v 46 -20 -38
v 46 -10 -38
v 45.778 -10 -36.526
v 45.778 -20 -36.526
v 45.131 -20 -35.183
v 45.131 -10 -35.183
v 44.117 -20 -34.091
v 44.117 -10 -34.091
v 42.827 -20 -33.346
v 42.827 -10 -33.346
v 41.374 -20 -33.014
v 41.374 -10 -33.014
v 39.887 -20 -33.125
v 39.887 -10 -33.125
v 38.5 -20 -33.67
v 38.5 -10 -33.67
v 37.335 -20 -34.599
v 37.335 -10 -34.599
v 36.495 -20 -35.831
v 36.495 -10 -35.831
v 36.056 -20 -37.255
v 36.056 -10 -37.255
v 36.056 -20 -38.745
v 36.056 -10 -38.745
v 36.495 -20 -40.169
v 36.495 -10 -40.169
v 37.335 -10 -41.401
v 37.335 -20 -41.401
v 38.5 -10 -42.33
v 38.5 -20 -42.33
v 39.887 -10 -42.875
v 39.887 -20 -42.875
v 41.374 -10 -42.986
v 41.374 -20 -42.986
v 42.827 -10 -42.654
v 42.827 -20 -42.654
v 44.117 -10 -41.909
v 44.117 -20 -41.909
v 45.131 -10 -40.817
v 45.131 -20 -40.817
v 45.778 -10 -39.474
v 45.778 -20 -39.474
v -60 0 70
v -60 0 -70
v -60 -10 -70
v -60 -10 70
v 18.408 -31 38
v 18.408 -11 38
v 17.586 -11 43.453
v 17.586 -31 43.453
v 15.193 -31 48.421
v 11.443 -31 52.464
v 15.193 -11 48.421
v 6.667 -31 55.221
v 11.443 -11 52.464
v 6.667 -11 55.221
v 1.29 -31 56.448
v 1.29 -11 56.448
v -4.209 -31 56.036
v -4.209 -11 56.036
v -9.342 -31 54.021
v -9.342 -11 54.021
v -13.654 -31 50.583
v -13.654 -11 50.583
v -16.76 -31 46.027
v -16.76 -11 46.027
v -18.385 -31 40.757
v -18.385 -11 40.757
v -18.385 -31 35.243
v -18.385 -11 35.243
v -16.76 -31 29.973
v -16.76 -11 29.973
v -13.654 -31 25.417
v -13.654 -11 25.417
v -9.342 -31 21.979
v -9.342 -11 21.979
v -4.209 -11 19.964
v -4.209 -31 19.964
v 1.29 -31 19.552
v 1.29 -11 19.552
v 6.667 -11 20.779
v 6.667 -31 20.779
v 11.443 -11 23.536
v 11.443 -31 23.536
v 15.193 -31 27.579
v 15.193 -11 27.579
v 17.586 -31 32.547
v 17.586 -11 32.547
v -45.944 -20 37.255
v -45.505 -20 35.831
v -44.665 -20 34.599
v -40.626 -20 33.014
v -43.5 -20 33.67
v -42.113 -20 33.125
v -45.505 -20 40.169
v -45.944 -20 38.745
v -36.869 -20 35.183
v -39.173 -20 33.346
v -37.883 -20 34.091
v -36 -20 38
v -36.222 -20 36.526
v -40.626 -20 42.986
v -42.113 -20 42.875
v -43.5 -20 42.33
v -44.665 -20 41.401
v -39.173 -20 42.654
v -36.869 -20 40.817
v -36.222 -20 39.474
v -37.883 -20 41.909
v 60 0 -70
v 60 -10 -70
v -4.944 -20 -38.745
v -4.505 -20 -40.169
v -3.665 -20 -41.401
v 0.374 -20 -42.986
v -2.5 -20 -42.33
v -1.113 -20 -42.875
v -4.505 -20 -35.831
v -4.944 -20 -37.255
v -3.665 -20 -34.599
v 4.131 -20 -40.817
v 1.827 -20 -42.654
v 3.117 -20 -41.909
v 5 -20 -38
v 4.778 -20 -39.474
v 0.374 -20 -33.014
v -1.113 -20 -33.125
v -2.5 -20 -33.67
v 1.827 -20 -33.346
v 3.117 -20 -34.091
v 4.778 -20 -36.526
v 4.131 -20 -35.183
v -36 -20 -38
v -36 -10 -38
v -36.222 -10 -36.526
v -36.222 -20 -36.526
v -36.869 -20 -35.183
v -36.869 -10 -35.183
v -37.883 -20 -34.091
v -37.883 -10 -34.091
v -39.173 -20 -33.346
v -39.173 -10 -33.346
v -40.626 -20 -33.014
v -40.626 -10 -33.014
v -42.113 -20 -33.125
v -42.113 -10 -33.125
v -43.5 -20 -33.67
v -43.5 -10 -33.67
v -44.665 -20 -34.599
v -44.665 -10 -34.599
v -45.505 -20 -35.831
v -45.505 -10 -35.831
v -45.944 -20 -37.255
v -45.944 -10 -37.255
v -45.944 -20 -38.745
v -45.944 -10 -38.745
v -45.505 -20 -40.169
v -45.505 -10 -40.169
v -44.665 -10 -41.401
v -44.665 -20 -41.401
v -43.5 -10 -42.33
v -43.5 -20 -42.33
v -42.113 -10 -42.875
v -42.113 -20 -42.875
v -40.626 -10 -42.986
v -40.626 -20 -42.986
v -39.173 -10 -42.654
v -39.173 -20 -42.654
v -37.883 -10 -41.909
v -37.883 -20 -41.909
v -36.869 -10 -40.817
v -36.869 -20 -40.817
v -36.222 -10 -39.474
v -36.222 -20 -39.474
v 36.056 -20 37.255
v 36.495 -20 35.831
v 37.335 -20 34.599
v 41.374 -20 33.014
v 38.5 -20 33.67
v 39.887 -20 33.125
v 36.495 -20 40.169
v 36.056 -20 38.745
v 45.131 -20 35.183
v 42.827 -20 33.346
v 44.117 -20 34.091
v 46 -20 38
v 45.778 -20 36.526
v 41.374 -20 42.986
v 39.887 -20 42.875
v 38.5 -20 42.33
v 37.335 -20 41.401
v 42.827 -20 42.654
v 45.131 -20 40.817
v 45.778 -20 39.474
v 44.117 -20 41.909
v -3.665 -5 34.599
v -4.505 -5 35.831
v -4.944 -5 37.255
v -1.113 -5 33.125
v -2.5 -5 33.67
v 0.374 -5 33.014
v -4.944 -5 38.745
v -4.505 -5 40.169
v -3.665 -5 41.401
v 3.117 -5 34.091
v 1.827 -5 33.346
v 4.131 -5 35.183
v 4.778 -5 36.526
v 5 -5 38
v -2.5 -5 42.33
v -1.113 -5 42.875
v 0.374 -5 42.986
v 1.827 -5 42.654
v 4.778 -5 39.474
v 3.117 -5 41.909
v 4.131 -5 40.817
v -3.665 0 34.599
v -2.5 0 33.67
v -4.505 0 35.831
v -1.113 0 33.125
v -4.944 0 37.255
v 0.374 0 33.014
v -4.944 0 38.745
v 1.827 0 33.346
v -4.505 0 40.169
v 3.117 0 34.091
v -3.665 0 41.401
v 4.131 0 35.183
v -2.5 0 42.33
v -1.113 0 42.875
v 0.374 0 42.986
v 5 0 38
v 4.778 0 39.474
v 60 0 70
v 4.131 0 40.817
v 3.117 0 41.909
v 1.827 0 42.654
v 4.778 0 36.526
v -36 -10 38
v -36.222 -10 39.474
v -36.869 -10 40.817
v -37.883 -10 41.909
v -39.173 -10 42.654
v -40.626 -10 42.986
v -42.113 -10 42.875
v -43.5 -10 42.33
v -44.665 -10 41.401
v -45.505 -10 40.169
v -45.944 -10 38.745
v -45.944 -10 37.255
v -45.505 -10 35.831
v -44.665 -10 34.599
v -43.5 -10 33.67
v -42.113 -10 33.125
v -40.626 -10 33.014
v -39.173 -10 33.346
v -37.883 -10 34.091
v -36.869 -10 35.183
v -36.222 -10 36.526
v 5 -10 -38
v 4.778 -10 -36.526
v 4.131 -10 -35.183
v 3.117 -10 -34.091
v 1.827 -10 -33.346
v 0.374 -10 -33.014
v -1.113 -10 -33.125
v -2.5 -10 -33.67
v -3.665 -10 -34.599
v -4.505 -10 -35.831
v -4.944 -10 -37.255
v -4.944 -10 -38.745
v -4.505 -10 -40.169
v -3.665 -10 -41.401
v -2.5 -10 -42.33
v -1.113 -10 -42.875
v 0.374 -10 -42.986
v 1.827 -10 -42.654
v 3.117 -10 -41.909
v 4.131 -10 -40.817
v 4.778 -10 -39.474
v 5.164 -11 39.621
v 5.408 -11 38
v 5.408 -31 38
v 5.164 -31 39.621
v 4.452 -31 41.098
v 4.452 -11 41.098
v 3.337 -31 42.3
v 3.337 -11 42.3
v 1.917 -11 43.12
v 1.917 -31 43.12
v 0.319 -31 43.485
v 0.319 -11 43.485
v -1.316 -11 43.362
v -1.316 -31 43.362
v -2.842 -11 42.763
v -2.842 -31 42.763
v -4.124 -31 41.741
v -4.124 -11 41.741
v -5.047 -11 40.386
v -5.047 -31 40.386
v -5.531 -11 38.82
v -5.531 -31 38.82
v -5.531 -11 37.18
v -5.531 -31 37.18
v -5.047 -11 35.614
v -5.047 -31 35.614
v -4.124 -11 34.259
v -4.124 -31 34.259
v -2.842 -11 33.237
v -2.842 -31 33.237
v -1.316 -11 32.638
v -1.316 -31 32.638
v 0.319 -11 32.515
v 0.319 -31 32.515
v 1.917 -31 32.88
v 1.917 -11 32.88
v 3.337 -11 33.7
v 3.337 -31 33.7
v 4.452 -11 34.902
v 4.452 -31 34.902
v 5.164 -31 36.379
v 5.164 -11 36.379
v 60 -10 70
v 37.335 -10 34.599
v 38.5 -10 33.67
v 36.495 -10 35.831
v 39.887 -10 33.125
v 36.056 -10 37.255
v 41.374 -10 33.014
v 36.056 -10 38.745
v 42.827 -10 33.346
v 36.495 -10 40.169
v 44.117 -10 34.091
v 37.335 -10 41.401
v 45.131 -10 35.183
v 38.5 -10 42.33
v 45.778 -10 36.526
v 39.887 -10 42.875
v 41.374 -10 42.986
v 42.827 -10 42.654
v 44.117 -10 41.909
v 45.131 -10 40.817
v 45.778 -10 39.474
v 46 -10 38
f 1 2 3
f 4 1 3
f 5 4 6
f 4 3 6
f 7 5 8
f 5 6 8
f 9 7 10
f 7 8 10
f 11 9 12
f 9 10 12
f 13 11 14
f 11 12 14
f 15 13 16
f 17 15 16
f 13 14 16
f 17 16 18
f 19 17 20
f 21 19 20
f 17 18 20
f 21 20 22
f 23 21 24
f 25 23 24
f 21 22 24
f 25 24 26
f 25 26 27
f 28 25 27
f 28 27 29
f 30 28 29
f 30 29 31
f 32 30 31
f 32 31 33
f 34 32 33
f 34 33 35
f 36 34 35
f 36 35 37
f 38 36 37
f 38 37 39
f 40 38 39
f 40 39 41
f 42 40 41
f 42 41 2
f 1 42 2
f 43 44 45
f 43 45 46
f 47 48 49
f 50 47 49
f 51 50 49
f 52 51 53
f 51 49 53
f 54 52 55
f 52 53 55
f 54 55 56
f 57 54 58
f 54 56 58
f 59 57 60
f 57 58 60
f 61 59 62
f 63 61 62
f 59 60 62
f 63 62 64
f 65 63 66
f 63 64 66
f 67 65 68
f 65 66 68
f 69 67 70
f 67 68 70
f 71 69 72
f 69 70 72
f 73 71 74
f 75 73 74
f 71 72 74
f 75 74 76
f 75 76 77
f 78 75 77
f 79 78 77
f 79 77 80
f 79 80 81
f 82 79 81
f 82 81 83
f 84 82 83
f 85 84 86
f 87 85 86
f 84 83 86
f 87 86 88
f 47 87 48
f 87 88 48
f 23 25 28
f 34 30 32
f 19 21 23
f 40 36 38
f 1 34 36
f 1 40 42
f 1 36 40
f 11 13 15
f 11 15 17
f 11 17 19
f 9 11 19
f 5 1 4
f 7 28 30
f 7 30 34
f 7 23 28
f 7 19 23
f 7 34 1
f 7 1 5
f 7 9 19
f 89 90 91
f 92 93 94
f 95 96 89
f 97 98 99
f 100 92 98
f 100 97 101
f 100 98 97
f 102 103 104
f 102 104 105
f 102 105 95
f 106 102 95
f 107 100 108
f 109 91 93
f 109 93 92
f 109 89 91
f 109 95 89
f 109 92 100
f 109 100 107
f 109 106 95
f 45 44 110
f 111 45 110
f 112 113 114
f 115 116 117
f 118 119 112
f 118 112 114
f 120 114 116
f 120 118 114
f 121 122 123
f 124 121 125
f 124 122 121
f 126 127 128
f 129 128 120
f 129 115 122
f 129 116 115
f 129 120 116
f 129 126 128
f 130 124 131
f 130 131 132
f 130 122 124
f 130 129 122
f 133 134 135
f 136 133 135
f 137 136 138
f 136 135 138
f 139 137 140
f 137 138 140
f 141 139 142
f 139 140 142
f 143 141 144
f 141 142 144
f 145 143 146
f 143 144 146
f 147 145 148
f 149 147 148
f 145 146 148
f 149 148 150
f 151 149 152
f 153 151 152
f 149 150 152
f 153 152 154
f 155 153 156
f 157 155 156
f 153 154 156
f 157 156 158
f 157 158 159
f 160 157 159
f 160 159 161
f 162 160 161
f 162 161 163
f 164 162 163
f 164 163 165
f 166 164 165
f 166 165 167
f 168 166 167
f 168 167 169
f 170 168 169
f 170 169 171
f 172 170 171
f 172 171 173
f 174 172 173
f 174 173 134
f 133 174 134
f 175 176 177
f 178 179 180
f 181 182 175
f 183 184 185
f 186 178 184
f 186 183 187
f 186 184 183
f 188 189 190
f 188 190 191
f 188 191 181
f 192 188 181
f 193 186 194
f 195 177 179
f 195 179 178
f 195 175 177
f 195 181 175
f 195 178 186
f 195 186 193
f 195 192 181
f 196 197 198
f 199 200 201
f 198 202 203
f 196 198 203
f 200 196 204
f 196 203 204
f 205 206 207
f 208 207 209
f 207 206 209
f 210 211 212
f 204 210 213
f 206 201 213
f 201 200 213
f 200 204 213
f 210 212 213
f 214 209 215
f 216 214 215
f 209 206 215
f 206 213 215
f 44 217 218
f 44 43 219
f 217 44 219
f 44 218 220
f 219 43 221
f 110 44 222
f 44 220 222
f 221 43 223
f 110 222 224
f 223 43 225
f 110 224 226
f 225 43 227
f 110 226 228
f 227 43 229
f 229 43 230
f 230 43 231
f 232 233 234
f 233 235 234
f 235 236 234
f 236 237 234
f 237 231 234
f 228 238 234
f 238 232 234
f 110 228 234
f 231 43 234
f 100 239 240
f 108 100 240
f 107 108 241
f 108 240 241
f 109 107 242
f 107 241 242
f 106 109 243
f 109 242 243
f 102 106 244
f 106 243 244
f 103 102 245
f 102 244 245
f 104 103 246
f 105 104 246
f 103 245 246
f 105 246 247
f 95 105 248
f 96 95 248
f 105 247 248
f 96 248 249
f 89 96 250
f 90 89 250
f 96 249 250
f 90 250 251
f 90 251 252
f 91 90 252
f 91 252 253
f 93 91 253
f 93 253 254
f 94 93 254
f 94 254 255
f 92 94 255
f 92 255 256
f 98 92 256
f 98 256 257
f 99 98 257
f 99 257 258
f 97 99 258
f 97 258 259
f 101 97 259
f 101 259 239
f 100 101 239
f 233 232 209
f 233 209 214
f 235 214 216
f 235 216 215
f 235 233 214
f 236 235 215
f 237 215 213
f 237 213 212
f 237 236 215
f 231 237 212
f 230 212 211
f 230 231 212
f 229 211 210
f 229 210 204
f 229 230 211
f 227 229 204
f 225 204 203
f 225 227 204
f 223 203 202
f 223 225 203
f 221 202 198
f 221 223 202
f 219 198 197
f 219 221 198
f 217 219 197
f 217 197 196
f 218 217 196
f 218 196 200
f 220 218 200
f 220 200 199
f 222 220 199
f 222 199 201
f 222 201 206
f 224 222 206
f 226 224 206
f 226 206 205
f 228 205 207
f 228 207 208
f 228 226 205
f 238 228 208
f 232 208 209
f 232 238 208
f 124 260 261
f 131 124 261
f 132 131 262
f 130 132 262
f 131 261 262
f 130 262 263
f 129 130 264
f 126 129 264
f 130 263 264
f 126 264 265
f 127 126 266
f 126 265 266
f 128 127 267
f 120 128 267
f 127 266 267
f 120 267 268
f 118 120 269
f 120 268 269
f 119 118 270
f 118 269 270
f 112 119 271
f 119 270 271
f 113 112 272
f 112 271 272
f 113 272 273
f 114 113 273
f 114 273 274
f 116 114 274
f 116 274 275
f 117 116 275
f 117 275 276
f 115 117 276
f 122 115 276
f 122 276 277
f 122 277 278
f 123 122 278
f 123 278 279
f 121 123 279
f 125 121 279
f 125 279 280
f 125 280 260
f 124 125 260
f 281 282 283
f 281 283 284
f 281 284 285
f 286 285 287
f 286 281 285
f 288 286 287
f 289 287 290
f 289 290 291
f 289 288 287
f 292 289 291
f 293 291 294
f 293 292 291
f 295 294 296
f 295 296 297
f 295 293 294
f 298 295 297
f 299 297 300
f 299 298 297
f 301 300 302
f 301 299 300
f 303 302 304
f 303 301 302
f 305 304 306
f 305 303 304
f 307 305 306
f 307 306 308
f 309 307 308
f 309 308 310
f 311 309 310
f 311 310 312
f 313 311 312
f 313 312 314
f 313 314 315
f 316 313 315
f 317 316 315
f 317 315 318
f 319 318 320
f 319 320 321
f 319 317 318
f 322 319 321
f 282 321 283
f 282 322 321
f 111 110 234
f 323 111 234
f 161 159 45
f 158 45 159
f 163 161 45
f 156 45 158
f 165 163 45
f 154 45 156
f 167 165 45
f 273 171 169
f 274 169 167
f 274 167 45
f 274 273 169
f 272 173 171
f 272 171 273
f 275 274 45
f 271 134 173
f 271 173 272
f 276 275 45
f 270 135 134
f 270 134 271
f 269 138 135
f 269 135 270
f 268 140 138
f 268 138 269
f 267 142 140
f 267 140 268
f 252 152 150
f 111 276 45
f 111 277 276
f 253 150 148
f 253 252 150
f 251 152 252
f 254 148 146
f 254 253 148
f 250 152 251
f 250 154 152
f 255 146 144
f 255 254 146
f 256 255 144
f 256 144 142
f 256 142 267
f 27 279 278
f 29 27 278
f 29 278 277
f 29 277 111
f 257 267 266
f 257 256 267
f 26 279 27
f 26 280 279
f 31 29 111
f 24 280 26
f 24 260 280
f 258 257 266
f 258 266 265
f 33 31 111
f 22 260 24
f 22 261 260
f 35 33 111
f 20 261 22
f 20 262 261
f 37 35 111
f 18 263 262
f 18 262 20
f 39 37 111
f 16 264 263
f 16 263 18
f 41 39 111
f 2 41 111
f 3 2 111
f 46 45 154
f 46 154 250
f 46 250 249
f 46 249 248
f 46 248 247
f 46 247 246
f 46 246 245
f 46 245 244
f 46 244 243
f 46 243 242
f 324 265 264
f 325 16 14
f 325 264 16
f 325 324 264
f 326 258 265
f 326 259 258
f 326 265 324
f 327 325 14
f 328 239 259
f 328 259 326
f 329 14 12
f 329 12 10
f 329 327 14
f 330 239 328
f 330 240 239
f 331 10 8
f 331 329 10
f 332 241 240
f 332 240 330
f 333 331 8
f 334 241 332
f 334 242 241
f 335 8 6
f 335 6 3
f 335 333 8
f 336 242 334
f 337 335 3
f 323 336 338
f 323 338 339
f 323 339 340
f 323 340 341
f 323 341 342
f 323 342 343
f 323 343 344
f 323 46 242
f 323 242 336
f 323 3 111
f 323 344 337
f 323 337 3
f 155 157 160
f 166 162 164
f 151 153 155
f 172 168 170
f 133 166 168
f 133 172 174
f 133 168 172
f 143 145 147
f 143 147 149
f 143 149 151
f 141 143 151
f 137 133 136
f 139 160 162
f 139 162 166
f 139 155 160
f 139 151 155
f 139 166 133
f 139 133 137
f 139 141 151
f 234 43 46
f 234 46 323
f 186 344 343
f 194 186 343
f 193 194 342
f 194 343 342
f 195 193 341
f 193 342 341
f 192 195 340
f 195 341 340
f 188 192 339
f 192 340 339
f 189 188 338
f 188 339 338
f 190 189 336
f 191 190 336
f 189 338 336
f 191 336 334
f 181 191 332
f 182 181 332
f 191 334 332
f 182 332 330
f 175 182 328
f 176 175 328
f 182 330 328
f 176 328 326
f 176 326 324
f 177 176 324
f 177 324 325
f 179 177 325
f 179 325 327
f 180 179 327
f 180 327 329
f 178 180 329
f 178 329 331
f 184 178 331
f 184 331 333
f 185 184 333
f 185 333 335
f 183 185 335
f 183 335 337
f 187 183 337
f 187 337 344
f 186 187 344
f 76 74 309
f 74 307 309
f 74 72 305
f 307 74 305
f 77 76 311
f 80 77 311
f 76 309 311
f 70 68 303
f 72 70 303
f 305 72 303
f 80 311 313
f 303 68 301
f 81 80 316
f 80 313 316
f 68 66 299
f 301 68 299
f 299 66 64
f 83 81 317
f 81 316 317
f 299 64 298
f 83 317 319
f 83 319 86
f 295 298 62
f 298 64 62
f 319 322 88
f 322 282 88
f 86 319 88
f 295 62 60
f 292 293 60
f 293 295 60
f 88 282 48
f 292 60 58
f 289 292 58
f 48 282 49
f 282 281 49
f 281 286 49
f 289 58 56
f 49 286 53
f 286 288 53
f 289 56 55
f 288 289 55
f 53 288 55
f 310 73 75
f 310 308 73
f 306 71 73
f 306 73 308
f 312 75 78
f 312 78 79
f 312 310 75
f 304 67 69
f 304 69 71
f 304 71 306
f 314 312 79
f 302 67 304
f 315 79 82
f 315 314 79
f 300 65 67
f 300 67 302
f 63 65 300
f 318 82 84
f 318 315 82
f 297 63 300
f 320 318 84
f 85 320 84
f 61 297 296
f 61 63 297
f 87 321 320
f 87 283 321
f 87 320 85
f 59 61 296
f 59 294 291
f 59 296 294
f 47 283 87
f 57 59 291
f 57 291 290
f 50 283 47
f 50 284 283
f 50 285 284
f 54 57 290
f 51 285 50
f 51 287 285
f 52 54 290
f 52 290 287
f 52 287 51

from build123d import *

# Parameters (mm, degrees)
F0_W     = 120
F0_H     = 140
F0_R     = 5
F1_DEPTH = 10
F2_DEPTH = 5
F3_DEPTH = 20
F5_R     = 18.5
F5_R_2   = 5.5
F6_DEPTH = 20


with BuildPart() as f1:
    # F0 (on Front) → F1 (new body)
    with BuildSketch(Plane.XZ):
        Rectangle(F0_W, F0_H)
        with Locations((-41, -38)):
            Circle(F0_R, mode=Mode.SUBTRACT)
        with Locations((0, -38)):
            Circle(F0_R, mode=Mode.SUBTRACT)
        with Locations((41, -38)):
            Circle(F0_R, mode=Mode.SUBTRACT)
        with Locations((-41, 38)):
            Circle(F0_R, mode=Mode.SUBTRACT)
        with Locations((0, 38)):
            Circle(F0_R, mode=Mode.SUBTRACT)
        with Locations((41, 38)):
            Circle(F0_R, mode=Mode.SUBTRACT)
        with Locations((0, 38)):
            Circle(F0_R)
        with Locations((-41, 38)):
            Circle(F0_R)
        with Locations((41, 38)):
            Circle(F0_R)
        with Locations((41, -38)):
            Circle(F0_R)
        with Locations((-41, -38)):
            Circle(F0_R)
    extrude(amount=F1_DEPTH)

    # F0 (on Front) → F2 (cut)
    with BuildSketch(Plane.XZ):
        with Locations((0, 38)):
            Circle(F0_R)
    extrude(amount=F2_DEPTH, mode=Mode.SUBTRACT)

    # F0 (on Front) → F3 (join)
    with BuildSketch(Plane.XZ):
        with Locations((-41, 38)):
            Circle(F0_R)
        with Locations((-41, -38)):
            Circle(F0_R)
        with Locations((41, -38)):
            Circle(F0_R)
        with Locations((41, 38)):
            Circle(F0_R)
        with Locations((0, -38)):
            Circle(F0_R)
    extrude(amount=F3_DEPTH)


with BuildPart() as f6:
    # F5 (on offset) → F6 (new body)
    with BuildSketch(Plane.XZ.offset(11)):
        with Locations((-0.0920584644, 38)):
            Circle(F5_R)
        with Locations((-0.0920584644, 38)):
            Circle(F5_R_2, mode=Mode.SUBTRACT)
    extrude(amount=F6_DEPTH)


solid = Compound([f1.part, f6.part])
